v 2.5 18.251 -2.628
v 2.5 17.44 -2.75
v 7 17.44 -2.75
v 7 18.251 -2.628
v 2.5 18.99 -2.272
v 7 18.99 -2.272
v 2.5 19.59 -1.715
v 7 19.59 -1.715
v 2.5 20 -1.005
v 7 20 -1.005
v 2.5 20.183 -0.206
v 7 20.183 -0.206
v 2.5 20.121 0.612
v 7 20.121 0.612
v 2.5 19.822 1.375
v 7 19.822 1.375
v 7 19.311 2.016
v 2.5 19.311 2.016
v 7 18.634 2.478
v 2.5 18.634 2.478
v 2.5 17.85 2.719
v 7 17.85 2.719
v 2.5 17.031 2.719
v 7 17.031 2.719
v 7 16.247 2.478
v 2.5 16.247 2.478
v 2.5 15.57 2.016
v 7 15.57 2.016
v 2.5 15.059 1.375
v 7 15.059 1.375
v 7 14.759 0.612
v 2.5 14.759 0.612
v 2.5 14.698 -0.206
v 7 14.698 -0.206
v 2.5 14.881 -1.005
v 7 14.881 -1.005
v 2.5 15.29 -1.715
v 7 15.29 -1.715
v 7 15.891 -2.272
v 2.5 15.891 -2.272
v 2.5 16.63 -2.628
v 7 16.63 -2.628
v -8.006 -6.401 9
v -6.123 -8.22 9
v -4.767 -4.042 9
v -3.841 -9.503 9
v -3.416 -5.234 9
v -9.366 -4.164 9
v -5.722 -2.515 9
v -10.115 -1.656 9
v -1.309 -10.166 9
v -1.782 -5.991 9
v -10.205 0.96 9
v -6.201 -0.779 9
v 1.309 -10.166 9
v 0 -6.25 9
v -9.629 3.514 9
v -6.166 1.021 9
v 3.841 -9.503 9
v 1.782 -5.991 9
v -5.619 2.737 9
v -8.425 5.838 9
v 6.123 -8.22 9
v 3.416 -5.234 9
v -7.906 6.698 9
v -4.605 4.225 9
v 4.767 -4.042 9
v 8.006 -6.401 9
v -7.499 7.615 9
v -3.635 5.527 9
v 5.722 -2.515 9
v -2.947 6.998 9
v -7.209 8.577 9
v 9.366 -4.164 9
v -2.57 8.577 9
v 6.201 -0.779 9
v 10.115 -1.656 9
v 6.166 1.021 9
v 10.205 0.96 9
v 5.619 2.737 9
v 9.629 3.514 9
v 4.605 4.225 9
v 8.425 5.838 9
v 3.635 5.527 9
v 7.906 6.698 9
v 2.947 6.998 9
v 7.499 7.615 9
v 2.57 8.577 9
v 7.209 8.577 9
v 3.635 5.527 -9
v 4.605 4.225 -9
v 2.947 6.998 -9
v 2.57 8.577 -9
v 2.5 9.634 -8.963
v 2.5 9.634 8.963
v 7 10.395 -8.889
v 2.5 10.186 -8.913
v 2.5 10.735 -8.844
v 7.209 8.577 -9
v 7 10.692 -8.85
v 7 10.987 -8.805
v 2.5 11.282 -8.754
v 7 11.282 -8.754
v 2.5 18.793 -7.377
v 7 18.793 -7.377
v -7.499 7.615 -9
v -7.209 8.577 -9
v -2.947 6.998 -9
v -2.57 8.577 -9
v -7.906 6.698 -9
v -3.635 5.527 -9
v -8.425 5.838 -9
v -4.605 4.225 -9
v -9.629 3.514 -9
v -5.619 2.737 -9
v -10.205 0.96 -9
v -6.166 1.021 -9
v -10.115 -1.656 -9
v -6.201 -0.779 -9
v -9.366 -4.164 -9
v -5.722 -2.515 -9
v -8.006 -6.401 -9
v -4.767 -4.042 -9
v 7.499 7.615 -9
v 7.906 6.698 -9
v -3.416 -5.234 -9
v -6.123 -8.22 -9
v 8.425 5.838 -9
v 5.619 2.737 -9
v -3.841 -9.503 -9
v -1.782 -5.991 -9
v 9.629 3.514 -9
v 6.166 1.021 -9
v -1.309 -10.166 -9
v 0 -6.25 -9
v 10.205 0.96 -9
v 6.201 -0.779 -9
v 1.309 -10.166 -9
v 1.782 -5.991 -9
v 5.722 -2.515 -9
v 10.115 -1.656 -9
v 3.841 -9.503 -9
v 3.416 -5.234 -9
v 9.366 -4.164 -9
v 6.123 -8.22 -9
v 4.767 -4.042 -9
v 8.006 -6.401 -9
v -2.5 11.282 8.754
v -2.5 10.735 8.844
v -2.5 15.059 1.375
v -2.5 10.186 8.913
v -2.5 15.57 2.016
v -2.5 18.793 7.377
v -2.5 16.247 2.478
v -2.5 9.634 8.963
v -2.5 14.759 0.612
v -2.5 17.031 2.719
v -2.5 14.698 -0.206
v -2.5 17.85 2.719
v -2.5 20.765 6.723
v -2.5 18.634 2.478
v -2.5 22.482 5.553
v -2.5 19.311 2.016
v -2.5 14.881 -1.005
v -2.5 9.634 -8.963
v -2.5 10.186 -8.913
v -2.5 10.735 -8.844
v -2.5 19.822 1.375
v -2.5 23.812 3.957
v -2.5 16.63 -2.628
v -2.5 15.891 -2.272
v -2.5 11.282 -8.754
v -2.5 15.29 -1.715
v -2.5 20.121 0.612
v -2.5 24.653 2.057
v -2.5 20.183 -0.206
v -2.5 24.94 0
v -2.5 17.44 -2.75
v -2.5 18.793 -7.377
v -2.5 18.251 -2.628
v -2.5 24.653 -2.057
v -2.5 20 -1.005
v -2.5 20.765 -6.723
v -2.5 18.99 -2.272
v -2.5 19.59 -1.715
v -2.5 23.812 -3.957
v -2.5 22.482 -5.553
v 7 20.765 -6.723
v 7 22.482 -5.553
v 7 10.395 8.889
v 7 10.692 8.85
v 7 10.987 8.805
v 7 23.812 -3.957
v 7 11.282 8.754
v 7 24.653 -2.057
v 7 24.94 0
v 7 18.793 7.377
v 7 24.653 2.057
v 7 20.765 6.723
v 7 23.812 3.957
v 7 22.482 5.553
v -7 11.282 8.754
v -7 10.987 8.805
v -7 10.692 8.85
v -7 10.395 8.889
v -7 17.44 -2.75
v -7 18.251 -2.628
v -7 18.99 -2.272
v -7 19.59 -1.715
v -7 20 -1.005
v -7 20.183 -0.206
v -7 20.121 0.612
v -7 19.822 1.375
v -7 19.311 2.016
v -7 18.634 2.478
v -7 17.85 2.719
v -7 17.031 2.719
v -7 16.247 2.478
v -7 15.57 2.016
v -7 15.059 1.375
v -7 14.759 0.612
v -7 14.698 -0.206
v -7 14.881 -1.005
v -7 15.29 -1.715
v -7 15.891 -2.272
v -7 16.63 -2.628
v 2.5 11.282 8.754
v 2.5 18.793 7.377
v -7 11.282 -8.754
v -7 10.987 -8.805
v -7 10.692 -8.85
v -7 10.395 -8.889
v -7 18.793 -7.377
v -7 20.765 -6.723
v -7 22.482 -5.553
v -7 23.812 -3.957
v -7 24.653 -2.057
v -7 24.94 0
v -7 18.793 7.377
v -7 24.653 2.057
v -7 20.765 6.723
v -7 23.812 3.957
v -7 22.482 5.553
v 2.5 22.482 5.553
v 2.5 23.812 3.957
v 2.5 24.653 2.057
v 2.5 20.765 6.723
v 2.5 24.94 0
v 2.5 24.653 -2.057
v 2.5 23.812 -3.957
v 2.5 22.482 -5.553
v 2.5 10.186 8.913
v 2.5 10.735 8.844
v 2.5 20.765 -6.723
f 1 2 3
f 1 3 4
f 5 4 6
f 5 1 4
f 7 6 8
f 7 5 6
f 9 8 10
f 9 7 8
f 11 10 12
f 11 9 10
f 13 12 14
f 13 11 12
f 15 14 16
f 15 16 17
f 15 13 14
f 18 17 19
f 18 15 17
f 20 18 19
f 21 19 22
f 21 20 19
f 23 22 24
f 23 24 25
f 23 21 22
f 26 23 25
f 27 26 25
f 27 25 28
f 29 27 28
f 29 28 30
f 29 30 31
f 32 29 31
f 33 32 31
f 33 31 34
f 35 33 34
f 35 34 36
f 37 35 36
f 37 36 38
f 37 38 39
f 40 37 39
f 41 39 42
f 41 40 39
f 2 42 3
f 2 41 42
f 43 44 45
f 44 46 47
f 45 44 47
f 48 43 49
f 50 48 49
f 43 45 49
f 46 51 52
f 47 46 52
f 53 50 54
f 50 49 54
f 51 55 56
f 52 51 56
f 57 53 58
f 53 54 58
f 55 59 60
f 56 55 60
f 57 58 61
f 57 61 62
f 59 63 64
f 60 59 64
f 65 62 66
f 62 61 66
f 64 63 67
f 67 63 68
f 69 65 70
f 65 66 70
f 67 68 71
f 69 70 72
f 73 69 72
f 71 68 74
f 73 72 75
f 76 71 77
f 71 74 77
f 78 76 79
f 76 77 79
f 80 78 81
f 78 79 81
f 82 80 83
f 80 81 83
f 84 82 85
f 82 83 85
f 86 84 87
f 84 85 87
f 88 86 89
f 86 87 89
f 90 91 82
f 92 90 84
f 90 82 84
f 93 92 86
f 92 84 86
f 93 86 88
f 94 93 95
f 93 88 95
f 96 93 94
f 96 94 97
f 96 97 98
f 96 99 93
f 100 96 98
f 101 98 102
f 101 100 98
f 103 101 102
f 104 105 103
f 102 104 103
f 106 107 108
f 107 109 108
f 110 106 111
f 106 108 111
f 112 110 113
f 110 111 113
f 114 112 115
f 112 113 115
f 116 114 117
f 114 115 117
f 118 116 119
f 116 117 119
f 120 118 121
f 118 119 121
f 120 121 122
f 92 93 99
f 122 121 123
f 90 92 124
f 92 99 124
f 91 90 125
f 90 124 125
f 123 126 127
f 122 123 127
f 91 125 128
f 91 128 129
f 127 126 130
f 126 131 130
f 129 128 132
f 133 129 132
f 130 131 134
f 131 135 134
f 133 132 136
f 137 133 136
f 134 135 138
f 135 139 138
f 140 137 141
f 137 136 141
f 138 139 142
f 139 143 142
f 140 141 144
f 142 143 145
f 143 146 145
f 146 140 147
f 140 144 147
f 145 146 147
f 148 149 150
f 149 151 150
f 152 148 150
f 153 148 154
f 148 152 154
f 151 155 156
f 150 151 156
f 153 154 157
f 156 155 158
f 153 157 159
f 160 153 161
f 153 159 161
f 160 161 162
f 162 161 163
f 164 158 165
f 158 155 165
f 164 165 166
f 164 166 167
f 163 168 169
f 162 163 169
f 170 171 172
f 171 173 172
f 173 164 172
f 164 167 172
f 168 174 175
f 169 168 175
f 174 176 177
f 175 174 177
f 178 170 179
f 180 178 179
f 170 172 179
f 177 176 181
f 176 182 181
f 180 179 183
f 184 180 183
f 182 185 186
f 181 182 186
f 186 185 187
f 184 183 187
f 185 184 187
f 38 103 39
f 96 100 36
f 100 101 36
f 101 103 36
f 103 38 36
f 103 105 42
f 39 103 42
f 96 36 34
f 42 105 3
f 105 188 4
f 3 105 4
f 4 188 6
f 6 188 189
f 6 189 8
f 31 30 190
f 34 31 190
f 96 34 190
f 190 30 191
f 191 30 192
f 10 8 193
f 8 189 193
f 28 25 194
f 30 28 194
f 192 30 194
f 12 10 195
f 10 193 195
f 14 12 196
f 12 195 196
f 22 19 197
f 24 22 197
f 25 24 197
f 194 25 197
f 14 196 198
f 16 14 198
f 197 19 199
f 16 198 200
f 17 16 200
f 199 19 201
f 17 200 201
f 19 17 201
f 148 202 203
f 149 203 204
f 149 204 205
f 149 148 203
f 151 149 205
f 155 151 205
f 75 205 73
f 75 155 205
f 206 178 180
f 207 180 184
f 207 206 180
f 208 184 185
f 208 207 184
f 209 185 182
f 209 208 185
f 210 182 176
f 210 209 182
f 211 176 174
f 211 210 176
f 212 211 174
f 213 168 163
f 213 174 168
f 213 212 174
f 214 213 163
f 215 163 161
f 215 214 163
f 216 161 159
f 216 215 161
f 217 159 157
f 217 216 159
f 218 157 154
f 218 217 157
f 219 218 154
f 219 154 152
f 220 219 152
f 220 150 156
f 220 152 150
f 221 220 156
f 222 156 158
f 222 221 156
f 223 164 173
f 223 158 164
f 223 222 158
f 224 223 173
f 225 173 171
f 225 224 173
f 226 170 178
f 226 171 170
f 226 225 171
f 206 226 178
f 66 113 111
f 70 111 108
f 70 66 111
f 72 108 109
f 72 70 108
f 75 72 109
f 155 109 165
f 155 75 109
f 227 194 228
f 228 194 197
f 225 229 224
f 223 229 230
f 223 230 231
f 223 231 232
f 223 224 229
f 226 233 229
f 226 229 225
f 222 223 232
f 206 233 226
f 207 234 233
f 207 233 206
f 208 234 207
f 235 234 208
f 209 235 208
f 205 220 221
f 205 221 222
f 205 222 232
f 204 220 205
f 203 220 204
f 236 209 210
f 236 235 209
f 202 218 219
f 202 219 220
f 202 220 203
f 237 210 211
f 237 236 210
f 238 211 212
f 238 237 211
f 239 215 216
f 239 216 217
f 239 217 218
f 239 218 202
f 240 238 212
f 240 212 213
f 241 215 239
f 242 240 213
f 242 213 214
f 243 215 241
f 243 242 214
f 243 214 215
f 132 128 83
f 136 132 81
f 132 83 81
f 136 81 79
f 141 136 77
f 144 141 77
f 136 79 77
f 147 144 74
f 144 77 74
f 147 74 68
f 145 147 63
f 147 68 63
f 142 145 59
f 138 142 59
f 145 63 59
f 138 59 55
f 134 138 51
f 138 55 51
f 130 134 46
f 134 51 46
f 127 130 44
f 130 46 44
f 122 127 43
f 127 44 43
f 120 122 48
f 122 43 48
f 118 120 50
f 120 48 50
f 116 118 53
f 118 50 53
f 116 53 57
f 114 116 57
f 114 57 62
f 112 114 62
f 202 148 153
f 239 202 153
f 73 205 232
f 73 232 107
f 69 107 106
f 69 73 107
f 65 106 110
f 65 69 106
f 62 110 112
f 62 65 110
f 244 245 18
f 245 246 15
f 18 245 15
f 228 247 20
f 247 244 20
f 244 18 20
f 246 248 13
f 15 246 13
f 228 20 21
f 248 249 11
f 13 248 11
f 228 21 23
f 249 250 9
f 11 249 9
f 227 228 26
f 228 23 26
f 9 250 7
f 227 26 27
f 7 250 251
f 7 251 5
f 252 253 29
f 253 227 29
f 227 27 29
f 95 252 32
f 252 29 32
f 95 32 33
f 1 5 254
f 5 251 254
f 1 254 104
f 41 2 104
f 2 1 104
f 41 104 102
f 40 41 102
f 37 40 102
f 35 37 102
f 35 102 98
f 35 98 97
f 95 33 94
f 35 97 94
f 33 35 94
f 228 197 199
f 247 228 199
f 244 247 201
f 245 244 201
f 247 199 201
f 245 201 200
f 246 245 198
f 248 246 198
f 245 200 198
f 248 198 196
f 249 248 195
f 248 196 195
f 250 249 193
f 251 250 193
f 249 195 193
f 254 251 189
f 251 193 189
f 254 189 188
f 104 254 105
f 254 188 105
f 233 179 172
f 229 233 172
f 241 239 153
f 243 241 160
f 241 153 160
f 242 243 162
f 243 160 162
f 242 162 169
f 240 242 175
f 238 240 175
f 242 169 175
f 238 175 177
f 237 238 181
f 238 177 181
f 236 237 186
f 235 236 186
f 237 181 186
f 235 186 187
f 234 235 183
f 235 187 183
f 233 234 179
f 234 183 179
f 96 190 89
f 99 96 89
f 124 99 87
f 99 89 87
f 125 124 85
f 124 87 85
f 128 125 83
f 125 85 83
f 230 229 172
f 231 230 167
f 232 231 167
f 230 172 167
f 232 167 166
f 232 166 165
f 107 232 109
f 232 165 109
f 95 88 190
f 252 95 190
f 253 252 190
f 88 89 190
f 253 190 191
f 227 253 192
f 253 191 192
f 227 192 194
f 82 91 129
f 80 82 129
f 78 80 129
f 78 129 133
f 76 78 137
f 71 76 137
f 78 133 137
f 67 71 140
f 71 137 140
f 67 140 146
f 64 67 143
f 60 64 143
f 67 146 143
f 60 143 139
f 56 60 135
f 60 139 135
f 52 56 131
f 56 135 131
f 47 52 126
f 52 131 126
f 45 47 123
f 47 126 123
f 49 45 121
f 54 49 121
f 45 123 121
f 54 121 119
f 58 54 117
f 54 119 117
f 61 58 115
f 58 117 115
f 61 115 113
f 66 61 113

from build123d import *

# Parameters (mm, degrees)
BOSS_EXTRUDE1_DEPTH     = 9
SKETCH2_R               = 2.75
BOSS_EXTRUDE2_DEPTH     = 7
CUT_EXTRUDE1_DEPTH      = 33.420493986
CUT_EXTRUDE1_DEPTH_BACK = 33.420493986
FILLET1_R               = 8
FILLET2_R               = 15


with BuildPart() as part:
    # Sketch1 → Boss-Extrude1 (new, symmetric)
    with BuildSketch(Plane.XY):
        with BuildLine():
            Line((-2.5, 9.940447676), (-2.5, 5.728219619))
            ThreePointArc((-2.5, 5.728219619), (0, -6.25), (2.5, 5.728219619))
            Line((2.5, 5.728219619), (2.5, 9.940447676))
            ThreePointArc((2.5, 9.940447676), (0, -10.25), (-2.5, 9.940447676))
        make_face()
    extrude(amount=BOSS_EXTRUDE1_DEPTH, both=True)

    # Sketch2 → Boss-Extrude2 (add, symmetric)
    with BuildSketch(Plane(origin=(0, 0, 0), x_dir=(0, 0, -1), z_dir=(1, 0, 0))):
        with BuildLine():
            Line((-9, 9.940447676), (-7.37704918, 18.792906692))
            ThreePointArc((-7.37704918, 18.792906692), (0, 24.940447676), (7.37704918, 18.792906692))
            Line((7.37704918, 18.792906692), (9, 9.940447676))
            Line((9, 9.940447676), (9, -0.154776162))
            Line((9, -0.154776162), (-9, -0.154776162))
            Line((-9, -0.154776162), (-9, 9.940447676))
        make_face()
        with Locations((0, 17.440447676)):
            Circle(SKETCH2_R, mode=Mode.SUBTRACT)
    extrude(amount=BOSS_EXTRUDE2_DEPTH, both=True)

    # Sketch3 → Cut-Extrude1 (cut, two sides: drawn at the far end of the back side and taken through both)
    with BuildSketch(Plane.XY.offset(9).offset(-CUT_EXTRUDE1_DEPTH_BACK)):
        with BuildLine():
            Line((-2.5, 9.940447676), (-2.5, 24.940447676))
            Line((-2.5, 24.940447676), (2.5, 24.940447676))
            Line((2.5, 24.940447676), (2.5, 9.940447676))
            Line((2.5, 9.940447676), (2.5, 5.728219619))
            ThreePointArc((2.5, 5.728219619), (0, -6.25), (-2.5, 5.728219619))
            Line((-2.5, 5.728219619), (-2.5, 9.940447676))
        make_face()
    extrude(amount=CUT_EXTRUDE1_DEPTH + CUT_EXTRUDE1_DEPTH_BACK, mode=Mode.SUBTRACT)

    # Fillet1
    fillet1_edges = [part.edges().sort_by_distance(p)[0] for p in [
        (-7, 7.487489566, 0),
        (7, 7.487489566, 0),
        (-2.5, 5.728219619, 0),
        (2.5, 5.728219619, 0),
    ]]
    fillet(fillet1_edges, radius=FILLET1_R)

    # Fillet2
    fillet2_edges = [part.edges().sort_by_distance(p)[0] for p in [
        (-4.756470892, 9.940447676, 9),
        (4.756470892, 9.940447676, 9),
        (4.756470892, 9.940447676, -9),
        (-4.756470892, 9.940447676, -9),
    ]]
    fillet(fillet2_edges, radius=FILLET2_R)


solid = part.part
